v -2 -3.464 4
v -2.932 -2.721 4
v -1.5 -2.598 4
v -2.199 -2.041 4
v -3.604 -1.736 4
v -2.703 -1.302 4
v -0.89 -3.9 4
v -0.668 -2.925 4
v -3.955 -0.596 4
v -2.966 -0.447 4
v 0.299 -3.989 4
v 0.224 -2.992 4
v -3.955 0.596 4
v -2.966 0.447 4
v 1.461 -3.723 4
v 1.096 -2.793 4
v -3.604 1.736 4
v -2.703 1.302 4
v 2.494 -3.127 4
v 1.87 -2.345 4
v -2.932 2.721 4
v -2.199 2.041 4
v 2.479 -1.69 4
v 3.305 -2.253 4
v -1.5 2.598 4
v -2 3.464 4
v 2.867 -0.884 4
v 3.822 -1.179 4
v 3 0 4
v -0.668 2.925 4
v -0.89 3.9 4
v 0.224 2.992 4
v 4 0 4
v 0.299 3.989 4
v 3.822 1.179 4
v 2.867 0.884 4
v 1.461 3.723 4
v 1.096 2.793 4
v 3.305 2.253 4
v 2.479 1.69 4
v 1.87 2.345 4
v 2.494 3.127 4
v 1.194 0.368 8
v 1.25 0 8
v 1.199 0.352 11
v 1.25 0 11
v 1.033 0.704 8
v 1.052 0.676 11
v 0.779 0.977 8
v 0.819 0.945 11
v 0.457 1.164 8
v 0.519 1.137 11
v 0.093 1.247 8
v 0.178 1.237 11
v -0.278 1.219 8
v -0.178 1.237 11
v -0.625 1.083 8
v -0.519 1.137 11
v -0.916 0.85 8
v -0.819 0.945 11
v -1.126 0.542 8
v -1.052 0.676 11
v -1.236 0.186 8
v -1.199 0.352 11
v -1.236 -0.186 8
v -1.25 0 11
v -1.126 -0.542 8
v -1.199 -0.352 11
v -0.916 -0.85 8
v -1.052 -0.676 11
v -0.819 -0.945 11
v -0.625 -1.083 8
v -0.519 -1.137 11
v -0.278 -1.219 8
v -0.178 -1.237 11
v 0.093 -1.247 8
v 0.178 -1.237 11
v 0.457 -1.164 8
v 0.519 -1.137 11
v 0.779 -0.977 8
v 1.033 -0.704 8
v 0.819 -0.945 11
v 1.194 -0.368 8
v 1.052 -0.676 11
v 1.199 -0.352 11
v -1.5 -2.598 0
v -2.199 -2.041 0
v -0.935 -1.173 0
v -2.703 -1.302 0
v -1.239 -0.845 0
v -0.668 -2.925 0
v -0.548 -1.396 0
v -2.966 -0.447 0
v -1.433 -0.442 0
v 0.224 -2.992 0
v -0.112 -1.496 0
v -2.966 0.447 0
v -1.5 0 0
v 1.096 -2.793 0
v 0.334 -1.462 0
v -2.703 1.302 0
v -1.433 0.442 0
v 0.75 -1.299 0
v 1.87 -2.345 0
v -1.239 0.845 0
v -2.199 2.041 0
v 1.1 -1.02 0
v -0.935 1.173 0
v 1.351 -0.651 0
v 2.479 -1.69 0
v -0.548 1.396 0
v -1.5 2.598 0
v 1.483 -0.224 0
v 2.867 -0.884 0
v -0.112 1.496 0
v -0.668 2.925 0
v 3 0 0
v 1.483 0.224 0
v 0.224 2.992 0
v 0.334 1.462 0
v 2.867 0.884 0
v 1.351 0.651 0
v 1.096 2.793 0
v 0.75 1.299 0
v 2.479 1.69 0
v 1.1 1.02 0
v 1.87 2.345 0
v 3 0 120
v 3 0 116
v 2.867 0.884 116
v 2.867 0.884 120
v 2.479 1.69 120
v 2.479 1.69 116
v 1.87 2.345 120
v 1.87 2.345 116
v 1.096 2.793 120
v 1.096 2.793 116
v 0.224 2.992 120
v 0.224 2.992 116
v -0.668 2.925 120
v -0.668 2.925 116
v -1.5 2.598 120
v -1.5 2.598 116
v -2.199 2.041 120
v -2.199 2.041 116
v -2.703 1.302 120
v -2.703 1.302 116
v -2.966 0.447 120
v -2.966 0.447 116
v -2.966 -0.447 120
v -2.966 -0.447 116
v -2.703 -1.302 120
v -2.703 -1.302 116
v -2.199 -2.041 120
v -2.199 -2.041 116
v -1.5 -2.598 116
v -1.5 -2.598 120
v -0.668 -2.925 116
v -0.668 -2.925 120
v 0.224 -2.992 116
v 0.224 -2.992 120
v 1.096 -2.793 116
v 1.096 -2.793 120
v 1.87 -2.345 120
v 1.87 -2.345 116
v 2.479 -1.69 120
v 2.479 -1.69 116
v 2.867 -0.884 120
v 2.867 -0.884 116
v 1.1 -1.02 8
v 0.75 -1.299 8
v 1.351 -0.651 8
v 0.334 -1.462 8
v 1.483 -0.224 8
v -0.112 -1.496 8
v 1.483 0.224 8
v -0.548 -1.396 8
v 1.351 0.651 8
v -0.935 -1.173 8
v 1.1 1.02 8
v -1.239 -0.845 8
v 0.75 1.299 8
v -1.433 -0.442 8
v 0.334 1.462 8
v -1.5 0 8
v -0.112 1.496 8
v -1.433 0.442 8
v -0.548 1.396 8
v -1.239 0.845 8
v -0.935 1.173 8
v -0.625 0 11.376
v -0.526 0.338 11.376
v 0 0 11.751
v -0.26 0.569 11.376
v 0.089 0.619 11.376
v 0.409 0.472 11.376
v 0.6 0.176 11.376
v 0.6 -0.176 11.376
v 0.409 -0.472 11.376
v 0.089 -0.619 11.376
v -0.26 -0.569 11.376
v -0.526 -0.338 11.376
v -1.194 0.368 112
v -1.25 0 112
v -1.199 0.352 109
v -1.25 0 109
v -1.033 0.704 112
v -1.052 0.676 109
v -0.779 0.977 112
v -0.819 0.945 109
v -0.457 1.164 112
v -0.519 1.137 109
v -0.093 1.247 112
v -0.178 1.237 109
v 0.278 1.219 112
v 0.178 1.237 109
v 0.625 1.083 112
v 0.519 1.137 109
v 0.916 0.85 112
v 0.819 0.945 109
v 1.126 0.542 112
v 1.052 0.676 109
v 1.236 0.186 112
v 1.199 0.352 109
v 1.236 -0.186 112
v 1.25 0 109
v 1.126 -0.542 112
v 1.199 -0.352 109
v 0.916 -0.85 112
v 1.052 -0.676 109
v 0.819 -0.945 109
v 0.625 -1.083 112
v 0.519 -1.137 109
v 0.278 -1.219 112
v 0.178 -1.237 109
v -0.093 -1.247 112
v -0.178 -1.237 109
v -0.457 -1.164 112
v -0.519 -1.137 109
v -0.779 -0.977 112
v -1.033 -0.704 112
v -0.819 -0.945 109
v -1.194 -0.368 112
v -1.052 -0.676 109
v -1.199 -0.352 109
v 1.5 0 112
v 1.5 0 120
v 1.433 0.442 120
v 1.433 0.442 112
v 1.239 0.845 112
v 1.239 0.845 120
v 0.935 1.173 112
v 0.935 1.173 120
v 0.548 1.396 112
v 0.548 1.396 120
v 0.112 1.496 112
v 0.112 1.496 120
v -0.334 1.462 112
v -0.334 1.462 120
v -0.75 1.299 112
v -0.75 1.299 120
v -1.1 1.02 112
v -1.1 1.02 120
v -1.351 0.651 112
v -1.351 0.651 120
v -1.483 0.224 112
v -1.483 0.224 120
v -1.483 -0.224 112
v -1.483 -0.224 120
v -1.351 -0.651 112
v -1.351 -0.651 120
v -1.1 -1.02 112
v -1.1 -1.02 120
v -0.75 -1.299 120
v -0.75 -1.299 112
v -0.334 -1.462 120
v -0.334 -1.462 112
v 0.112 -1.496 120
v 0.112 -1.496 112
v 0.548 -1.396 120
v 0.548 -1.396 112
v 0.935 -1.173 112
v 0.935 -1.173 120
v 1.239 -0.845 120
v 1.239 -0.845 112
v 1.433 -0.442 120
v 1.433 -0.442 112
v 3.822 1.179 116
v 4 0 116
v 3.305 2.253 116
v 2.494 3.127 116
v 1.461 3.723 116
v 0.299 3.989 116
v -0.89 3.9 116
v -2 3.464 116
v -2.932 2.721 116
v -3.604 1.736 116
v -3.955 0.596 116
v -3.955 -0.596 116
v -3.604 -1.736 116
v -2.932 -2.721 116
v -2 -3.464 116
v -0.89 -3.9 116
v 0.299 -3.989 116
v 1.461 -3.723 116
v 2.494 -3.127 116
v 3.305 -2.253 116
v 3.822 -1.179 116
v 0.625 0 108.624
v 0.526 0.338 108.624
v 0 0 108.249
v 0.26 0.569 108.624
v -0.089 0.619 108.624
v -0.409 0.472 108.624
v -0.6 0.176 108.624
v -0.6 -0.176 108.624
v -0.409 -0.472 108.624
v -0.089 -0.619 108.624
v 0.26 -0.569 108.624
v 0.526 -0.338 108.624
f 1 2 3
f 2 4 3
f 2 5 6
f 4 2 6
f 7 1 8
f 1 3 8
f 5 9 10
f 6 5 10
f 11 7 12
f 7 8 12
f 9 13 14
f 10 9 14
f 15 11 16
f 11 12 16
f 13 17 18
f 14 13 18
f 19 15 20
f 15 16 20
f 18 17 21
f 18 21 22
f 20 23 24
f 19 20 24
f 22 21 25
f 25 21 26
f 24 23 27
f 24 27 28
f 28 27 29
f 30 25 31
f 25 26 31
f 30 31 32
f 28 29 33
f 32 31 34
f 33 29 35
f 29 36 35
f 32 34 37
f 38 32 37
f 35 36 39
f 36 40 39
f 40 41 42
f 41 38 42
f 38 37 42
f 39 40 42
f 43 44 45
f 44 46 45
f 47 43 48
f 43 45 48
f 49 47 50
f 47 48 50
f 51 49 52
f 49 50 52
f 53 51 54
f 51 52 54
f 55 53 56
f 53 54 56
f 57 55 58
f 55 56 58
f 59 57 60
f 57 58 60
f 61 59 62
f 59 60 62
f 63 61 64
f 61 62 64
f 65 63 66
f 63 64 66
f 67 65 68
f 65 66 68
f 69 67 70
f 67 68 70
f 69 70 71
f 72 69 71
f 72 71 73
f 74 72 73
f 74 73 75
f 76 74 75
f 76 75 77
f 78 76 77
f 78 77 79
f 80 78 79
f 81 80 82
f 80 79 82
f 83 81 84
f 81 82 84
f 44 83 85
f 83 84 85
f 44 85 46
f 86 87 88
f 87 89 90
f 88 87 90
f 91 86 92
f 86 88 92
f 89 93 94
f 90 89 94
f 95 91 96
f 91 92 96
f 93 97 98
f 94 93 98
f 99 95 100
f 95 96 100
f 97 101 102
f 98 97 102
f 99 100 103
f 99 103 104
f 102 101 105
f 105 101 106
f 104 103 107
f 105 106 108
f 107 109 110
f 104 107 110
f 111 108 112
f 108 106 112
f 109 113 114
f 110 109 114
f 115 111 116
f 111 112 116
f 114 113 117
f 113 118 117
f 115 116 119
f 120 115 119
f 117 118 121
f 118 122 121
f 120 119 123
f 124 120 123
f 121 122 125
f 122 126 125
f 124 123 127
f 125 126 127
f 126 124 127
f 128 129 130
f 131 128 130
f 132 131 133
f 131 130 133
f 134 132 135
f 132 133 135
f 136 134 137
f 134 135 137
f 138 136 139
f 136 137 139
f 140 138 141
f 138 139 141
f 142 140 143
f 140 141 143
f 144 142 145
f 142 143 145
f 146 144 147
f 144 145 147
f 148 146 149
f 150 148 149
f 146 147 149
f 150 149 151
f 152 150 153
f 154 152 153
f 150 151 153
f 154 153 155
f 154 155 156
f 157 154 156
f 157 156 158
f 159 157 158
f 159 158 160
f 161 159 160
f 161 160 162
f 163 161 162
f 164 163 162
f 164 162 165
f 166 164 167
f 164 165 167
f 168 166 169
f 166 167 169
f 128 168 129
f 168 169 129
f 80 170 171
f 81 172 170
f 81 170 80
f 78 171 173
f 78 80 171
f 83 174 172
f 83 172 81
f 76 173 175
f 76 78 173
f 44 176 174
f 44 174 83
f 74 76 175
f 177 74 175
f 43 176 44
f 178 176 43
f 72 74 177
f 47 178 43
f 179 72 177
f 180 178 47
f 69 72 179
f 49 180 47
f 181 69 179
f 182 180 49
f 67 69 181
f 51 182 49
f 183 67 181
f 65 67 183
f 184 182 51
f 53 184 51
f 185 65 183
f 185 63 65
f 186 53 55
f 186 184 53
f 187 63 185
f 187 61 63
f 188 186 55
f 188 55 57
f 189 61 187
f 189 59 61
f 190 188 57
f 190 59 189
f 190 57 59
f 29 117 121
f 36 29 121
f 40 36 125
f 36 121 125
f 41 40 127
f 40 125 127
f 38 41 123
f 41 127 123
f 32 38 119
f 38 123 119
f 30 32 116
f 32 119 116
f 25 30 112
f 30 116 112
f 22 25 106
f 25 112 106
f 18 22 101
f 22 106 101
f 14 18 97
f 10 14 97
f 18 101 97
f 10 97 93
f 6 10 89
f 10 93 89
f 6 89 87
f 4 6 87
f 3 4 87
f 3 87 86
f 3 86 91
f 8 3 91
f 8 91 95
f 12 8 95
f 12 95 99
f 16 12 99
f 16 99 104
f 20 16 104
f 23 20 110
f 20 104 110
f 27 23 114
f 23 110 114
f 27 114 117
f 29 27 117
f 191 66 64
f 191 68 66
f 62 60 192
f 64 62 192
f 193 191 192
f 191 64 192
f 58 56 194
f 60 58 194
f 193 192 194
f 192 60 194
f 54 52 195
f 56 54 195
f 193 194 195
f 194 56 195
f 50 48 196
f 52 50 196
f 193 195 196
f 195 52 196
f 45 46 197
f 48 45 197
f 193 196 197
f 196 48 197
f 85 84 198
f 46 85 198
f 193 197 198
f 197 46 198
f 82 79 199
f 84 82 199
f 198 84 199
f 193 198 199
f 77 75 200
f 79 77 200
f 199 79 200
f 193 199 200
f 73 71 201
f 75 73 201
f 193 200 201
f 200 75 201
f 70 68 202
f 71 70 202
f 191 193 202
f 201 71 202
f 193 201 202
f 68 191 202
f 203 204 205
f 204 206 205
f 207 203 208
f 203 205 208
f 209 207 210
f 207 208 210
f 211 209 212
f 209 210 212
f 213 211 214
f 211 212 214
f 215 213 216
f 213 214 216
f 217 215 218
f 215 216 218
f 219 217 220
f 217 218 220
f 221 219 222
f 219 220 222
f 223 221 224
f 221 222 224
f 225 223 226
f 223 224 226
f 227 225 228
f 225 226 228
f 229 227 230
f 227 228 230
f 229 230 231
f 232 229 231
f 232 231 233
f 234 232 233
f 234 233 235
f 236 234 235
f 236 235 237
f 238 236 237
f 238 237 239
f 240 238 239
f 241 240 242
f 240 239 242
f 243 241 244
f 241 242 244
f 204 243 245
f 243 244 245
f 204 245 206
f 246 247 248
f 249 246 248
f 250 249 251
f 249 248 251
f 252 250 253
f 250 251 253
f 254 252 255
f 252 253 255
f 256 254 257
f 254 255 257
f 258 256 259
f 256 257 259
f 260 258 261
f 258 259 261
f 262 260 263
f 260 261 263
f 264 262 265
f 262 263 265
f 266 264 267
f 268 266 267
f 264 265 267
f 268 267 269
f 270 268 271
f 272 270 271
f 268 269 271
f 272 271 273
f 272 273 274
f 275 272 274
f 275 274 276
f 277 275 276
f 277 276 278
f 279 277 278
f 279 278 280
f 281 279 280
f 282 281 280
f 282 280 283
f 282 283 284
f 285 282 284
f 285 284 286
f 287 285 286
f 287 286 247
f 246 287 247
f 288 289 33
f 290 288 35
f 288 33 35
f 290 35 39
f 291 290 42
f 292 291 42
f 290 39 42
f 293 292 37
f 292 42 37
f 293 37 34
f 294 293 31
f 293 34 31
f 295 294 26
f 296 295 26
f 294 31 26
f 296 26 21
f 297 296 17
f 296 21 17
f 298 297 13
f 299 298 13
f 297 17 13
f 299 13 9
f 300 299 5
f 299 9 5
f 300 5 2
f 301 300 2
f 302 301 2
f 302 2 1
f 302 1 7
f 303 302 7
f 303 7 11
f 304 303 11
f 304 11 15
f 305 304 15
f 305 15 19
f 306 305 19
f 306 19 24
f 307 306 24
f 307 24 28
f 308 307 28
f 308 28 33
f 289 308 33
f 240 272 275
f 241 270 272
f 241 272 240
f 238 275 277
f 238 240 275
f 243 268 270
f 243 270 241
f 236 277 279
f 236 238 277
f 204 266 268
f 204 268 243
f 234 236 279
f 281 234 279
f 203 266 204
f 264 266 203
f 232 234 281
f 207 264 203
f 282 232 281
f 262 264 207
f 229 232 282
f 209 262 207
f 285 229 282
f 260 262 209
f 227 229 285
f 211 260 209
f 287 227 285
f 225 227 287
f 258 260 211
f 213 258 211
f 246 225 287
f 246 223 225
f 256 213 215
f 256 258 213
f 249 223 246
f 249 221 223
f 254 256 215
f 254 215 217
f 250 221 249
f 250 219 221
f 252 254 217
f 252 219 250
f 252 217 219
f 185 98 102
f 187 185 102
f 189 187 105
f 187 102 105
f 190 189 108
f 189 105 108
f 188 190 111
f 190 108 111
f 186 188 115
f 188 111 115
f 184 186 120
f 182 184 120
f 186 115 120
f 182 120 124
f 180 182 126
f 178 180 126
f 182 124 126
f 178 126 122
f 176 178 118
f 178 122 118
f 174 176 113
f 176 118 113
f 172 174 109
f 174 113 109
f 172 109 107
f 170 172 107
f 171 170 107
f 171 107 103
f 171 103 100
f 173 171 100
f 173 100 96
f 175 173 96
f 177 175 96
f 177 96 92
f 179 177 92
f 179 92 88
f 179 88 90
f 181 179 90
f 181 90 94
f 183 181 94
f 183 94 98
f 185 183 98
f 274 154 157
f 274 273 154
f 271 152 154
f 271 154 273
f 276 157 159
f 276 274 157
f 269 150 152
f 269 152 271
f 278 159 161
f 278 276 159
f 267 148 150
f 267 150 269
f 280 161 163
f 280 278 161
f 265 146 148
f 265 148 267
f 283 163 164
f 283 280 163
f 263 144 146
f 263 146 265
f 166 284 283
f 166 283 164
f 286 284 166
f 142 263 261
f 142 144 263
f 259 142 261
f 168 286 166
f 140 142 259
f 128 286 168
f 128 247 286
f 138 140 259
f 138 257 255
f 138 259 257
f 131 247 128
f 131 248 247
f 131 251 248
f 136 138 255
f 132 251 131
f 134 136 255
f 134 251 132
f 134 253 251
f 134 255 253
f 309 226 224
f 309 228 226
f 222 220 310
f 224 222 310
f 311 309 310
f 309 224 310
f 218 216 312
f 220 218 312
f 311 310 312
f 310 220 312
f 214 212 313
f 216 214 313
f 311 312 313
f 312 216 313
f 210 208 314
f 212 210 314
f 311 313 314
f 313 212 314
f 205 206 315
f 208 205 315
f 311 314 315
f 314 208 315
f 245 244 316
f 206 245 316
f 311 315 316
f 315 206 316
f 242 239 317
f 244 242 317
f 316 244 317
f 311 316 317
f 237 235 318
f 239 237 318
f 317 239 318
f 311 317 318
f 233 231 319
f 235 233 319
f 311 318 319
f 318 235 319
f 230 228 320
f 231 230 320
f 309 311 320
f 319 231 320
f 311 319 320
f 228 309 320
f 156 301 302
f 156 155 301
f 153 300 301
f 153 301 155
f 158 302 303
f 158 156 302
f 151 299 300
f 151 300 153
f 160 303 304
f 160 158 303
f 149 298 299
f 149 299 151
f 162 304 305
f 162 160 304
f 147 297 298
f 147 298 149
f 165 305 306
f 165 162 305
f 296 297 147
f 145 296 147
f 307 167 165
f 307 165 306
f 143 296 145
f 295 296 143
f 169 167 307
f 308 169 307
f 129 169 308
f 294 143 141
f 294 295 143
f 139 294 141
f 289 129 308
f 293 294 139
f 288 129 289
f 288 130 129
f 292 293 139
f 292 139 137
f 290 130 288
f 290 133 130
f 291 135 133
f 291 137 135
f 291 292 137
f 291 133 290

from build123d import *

# Parameters (mm, degrees)
ESQUISSE1_R             = 4
BASE_EXTRUSION_DEPTH    = 120
ESQUISSE2_R             = 4
ESQUISSE2_R_2           = 3
ENL_V_MAT_EXTRU_1_DEPTH = 4
ENL_V_START             = -4
ESQUISSE3_R             = 4
ESQUISSE3_R_2           = 3
ENL_V_MAT_EXTRU_2_DEPTH = 4
PER_AGE1_D              = 2.5
PER_AGE1_DEPTH          = 11
PER_AGE1_CBORE_D        = 3
PER_AGE1_CBORE_DEPTH    = 8
PER_AGE1_TIP            = 0.751075774
PER_AGE2_D              = 2.5
PER_AGE2_DEPTH          = 11
PER_AGE2_CBORE_D        = 3
PER_AGE2_CBORE_DEPTH    = 8
PER_AGE2_TIP            = 0.751075774


with BuildPart() as part:
    # Esquisse1 → Base-Extrusion (new body)
    with BuildSketch(Plane.XY):
        Circle(ESQUISSE1_R)
    extrude(amount=BASE_EXTRUSION_DEPTH)

    # Esquisse2 → Enlèv. mat.-Extru.1 (cut)
    with BuildSketch(Plane.XY):
        Circle(ESQUISSE2_R)
        Circle(ESQUISSE2_R_2, mode=Mode.SUBTRACT)
    extrude(amount=ENL_V_MAT_EXTRU_1_DEPTH, mode=Mode.SUBTRACT)

    # Esquisse3 → Enlèv. mat.-Extru.2 (cut)
    with BuildSketch(Plane.XY.offset(120).offset(ENL_V_START)):
        Circle(ESQUISSE3_R)
        Circle(ESQUISSE3_R_2, mode=Mode.SUBTRACT)
    extrude(amount=ENL_V_MAT_EXTRU_2_DEPTH, mode=Mode.SUBTRACT)

    # Perçage1
    with Locations(Plane.XY.offset(120)):
        with Locations((0, 0)):
            CounterBoreHole(PER_AGE1_D / 2, PER_AGE1_CBORE_D / 2, PER_AGE1_CBORE_DEPTH, depth=PER_AGE1_DEPTH)
            with Locations((0, 0, -(PER_AGE1_DEPTH + PER_AGE1_TIP / 2))):  # 118° drill point
                Cone(0, PER_AGE1_D / 2, PER_AGE1_TIP, mode=Mode.SUBTRACT)

    # Perçage2
    with Locations(Plane(origin=(0, 0, 0), x_dir=(-1, 0, 0), z_dir=(0, 0, -1))):
        with Locations((0, 0)):
            CounterBoreHole(PER_AGE2_D / 2, PER_AGE2_CBORE_D / 2, PER_AGE2_CBORE_DEPTH, depth=PER_AGE2_DEPTH)
            with Locations((0, 0, -(PER_AGE2_DEPTH + PER_AGE2_TIP / 2))):  # 118° drill point
                Cone(0, PER_AGE2_D / 2, PER_AGE2_TIP, mode=Mode.SUBTRACT)


solid = part.part
